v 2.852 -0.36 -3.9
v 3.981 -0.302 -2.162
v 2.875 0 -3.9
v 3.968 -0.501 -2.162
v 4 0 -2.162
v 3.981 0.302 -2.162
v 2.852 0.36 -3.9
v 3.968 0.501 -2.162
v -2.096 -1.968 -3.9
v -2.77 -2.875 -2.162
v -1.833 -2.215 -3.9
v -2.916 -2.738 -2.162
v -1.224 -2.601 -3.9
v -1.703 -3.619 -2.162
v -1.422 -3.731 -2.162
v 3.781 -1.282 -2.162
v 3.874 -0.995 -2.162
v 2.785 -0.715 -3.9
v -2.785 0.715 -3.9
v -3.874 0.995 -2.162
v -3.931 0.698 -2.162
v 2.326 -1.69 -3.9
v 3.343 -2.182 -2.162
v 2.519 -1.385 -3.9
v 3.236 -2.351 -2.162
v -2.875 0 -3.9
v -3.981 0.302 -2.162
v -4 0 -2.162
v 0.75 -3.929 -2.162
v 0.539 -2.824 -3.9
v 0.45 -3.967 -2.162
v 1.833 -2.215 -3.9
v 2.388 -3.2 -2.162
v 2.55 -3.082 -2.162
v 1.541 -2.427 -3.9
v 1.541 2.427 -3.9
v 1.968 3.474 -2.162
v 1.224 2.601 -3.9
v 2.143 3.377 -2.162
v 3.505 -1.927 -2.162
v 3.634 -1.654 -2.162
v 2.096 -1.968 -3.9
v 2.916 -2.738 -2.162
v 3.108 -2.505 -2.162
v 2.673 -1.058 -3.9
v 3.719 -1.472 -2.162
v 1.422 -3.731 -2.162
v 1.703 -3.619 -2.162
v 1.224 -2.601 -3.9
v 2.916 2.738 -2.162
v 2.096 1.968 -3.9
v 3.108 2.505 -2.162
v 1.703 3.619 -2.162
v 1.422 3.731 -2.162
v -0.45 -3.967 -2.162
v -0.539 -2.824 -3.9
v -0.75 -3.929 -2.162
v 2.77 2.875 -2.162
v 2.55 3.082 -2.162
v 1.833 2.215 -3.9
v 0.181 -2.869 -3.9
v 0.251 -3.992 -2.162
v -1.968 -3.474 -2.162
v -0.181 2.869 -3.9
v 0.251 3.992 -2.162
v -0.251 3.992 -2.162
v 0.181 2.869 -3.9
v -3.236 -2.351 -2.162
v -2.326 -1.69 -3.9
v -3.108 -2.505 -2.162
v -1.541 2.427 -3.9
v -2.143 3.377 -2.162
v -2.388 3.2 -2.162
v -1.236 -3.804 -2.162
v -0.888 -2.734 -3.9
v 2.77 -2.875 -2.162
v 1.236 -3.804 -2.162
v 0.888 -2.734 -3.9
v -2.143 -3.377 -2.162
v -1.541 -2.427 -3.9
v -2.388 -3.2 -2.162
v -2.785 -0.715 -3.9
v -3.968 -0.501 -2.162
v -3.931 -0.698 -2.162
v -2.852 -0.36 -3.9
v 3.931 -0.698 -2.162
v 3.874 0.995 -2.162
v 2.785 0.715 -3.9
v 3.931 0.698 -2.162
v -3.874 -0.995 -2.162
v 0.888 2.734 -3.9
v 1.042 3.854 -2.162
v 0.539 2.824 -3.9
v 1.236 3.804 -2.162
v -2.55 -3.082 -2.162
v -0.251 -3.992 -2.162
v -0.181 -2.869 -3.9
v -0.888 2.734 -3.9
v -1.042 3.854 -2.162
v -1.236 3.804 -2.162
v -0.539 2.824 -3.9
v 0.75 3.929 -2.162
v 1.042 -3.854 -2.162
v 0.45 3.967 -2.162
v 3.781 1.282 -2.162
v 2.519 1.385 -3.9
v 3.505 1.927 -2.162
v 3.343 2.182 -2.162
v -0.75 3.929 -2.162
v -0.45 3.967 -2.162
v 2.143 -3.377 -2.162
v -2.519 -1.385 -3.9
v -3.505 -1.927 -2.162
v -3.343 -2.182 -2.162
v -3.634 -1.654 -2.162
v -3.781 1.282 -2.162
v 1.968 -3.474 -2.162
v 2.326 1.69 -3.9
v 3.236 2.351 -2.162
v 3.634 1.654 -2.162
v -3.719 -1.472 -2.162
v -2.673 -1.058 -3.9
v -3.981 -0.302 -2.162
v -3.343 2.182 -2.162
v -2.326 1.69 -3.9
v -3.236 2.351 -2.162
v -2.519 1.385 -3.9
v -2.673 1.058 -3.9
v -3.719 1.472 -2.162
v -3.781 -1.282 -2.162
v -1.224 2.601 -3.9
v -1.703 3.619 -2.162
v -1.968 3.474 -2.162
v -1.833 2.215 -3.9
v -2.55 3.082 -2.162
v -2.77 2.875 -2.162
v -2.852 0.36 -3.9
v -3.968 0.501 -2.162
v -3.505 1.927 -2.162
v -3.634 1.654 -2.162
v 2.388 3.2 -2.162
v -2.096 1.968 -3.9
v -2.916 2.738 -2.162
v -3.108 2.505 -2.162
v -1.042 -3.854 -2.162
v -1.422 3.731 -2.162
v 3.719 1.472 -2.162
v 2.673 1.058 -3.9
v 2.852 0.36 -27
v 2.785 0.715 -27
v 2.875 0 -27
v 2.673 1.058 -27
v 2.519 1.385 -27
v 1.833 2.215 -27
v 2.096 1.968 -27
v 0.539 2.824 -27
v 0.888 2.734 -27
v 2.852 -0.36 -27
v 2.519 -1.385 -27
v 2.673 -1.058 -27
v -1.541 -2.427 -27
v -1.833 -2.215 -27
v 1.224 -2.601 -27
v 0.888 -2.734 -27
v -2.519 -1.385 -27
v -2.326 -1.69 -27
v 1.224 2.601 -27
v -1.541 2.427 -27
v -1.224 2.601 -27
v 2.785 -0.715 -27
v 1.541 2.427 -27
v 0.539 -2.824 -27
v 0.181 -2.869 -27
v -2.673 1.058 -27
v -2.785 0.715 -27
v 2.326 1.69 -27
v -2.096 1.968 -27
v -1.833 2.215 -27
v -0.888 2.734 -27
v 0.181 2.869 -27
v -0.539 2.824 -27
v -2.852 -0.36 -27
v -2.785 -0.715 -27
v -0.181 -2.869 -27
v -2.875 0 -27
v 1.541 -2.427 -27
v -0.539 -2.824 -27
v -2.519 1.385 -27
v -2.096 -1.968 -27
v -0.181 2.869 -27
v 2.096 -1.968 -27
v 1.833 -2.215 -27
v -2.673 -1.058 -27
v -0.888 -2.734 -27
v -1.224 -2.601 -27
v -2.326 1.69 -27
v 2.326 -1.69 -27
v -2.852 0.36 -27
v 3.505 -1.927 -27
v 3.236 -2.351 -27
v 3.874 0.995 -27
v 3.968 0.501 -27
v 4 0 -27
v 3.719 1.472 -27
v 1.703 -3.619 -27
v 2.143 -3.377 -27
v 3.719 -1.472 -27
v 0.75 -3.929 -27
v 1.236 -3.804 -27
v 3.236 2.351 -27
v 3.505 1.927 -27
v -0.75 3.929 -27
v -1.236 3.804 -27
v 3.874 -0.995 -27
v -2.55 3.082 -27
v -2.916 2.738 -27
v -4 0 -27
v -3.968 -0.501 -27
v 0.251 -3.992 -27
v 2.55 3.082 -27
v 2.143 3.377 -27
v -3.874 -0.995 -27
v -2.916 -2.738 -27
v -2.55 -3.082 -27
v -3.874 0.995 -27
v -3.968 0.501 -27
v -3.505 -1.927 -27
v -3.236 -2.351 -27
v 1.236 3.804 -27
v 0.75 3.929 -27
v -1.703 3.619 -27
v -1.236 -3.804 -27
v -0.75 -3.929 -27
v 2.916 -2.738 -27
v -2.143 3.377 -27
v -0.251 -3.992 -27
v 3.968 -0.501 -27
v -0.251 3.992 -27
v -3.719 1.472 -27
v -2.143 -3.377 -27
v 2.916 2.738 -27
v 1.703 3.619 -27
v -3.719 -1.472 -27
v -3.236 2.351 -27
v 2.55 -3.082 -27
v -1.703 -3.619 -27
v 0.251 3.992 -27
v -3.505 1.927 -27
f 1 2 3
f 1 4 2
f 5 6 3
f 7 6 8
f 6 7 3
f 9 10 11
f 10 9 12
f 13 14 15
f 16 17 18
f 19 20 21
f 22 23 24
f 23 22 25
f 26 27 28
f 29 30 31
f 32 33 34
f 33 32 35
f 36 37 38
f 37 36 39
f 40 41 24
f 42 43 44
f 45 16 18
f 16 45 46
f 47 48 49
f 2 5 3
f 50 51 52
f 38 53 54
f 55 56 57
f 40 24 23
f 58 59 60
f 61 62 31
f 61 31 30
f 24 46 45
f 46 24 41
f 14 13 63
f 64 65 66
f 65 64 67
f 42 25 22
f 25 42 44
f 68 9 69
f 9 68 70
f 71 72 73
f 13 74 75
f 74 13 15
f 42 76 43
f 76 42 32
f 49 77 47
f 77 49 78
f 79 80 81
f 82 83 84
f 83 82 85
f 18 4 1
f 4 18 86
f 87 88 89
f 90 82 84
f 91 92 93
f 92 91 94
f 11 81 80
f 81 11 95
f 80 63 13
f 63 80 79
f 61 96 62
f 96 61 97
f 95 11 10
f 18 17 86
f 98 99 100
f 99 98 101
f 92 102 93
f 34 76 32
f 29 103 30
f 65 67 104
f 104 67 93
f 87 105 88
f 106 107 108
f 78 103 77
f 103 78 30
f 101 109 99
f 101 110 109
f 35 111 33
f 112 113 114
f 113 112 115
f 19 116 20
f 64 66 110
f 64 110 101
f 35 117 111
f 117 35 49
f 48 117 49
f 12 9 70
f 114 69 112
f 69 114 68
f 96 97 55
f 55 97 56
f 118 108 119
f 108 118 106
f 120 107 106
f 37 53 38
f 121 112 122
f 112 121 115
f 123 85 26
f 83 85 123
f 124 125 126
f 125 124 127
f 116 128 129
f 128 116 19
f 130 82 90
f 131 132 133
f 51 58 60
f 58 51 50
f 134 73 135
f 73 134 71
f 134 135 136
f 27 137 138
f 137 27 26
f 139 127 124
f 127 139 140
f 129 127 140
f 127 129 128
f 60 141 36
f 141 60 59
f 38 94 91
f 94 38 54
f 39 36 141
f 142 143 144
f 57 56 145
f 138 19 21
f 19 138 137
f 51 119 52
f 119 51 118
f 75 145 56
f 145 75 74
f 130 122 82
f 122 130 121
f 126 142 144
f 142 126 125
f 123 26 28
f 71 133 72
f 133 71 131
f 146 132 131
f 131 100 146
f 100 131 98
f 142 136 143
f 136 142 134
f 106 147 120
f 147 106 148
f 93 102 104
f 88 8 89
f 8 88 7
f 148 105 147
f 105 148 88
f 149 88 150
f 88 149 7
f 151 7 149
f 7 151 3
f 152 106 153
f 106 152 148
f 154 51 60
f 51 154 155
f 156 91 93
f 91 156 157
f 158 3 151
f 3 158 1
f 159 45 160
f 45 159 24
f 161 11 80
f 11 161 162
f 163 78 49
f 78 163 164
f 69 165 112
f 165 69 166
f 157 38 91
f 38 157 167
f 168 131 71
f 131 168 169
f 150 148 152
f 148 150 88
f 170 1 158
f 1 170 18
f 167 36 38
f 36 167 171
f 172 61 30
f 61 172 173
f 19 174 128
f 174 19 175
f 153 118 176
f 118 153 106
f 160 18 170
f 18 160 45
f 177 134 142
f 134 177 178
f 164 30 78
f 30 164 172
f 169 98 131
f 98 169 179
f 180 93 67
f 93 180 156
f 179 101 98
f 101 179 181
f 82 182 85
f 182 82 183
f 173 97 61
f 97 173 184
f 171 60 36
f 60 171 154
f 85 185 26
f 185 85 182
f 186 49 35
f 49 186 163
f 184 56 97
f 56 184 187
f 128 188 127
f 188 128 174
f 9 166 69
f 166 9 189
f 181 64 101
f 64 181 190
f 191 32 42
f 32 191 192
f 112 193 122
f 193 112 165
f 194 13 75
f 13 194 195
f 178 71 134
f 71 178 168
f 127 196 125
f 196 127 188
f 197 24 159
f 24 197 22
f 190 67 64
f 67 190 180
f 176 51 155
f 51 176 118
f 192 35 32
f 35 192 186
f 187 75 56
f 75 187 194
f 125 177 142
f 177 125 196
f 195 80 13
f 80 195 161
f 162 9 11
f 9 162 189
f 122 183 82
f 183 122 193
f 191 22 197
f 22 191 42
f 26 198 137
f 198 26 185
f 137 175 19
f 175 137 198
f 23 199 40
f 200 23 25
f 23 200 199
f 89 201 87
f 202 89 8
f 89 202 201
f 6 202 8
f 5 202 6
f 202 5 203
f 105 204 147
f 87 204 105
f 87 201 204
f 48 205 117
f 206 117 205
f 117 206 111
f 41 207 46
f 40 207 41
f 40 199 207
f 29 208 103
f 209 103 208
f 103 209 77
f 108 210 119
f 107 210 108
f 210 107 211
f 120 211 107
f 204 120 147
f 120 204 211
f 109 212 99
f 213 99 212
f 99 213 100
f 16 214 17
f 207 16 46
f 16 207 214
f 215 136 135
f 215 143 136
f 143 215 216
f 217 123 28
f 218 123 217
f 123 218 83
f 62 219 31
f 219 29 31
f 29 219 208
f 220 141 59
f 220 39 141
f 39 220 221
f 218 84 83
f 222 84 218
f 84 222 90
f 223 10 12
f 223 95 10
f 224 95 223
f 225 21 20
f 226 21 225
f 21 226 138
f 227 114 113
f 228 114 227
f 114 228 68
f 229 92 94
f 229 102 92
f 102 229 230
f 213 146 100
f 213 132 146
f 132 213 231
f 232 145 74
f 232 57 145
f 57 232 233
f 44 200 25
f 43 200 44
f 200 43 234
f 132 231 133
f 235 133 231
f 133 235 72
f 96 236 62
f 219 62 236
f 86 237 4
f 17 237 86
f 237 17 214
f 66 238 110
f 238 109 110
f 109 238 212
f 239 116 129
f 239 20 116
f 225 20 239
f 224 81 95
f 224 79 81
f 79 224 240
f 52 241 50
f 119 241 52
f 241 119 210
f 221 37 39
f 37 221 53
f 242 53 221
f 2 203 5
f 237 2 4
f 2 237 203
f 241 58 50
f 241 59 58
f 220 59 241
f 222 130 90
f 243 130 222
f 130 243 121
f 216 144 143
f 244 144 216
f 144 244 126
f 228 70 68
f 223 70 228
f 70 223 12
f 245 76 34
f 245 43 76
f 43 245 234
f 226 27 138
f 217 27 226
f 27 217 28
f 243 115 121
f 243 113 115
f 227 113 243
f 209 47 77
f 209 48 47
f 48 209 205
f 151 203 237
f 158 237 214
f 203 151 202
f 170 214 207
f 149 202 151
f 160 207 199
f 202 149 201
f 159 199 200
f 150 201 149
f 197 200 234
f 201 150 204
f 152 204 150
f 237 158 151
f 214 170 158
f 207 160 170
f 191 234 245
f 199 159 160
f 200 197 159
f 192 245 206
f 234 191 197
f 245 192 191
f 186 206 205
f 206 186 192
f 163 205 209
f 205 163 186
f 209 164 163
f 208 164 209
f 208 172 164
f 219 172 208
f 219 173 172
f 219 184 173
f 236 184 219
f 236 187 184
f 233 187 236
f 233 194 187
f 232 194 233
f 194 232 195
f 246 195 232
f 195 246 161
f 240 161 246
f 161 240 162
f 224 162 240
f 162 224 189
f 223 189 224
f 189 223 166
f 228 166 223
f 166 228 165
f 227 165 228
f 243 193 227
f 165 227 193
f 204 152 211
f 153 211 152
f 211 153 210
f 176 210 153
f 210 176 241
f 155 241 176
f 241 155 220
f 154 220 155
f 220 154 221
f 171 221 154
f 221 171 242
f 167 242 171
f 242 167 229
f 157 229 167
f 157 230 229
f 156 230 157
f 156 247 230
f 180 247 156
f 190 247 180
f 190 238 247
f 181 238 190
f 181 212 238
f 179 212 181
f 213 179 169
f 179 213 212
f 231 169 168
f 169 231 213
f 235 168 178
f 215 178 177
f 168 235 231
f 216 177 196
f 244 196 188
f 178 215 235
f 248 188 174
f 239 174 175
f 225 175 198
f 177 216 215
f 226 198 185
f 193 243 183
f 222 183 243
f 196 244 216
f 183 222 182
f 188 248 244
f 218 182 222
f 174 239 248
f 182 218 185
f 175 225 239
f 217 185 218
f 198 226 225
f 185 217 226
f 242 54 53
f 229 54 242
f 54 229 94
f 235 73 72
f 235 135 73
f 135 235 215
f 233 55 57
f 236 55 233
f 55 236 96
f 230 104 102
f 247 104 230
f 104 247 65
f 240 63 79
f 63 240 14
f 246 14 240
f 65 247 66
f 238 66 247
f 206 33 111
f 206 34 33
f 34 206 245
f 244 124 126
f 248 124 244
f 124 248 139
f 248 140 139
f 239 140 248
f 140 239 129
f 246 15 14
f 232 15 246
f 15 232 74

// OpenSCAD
$fn = 50;

difference() {
	union() {
		translate(v = [0, 0, -27.0]) {
			cylinder(h = 30, r = 4.0);
		}
	}
	union() {
		translate(v = [0, 0, 0]) {
			rotate(a = [0, 0, 0]) {
				difference() {
					union() {
						translate(v = [0, 0, -30.0]) {
							cylinder(h = 30, r = 2.6);
						}
						translate(v = [0, 0, -3.9]) {
							cylinder(h = 3.9, r1 = 2.875, r2 = 5.4);
						}
						translate(v = [0, 0, -30.0]) {
							cylinder(h = 30, r = 2.875);
						}
						translate(v = [0, 0, -30.0]) {
							cylinder(h = 30, r = 2.6);
						}
					}
					union();
				}
			}
		}
		#cylinder(h = 3, r = 5.0);
	}
}
